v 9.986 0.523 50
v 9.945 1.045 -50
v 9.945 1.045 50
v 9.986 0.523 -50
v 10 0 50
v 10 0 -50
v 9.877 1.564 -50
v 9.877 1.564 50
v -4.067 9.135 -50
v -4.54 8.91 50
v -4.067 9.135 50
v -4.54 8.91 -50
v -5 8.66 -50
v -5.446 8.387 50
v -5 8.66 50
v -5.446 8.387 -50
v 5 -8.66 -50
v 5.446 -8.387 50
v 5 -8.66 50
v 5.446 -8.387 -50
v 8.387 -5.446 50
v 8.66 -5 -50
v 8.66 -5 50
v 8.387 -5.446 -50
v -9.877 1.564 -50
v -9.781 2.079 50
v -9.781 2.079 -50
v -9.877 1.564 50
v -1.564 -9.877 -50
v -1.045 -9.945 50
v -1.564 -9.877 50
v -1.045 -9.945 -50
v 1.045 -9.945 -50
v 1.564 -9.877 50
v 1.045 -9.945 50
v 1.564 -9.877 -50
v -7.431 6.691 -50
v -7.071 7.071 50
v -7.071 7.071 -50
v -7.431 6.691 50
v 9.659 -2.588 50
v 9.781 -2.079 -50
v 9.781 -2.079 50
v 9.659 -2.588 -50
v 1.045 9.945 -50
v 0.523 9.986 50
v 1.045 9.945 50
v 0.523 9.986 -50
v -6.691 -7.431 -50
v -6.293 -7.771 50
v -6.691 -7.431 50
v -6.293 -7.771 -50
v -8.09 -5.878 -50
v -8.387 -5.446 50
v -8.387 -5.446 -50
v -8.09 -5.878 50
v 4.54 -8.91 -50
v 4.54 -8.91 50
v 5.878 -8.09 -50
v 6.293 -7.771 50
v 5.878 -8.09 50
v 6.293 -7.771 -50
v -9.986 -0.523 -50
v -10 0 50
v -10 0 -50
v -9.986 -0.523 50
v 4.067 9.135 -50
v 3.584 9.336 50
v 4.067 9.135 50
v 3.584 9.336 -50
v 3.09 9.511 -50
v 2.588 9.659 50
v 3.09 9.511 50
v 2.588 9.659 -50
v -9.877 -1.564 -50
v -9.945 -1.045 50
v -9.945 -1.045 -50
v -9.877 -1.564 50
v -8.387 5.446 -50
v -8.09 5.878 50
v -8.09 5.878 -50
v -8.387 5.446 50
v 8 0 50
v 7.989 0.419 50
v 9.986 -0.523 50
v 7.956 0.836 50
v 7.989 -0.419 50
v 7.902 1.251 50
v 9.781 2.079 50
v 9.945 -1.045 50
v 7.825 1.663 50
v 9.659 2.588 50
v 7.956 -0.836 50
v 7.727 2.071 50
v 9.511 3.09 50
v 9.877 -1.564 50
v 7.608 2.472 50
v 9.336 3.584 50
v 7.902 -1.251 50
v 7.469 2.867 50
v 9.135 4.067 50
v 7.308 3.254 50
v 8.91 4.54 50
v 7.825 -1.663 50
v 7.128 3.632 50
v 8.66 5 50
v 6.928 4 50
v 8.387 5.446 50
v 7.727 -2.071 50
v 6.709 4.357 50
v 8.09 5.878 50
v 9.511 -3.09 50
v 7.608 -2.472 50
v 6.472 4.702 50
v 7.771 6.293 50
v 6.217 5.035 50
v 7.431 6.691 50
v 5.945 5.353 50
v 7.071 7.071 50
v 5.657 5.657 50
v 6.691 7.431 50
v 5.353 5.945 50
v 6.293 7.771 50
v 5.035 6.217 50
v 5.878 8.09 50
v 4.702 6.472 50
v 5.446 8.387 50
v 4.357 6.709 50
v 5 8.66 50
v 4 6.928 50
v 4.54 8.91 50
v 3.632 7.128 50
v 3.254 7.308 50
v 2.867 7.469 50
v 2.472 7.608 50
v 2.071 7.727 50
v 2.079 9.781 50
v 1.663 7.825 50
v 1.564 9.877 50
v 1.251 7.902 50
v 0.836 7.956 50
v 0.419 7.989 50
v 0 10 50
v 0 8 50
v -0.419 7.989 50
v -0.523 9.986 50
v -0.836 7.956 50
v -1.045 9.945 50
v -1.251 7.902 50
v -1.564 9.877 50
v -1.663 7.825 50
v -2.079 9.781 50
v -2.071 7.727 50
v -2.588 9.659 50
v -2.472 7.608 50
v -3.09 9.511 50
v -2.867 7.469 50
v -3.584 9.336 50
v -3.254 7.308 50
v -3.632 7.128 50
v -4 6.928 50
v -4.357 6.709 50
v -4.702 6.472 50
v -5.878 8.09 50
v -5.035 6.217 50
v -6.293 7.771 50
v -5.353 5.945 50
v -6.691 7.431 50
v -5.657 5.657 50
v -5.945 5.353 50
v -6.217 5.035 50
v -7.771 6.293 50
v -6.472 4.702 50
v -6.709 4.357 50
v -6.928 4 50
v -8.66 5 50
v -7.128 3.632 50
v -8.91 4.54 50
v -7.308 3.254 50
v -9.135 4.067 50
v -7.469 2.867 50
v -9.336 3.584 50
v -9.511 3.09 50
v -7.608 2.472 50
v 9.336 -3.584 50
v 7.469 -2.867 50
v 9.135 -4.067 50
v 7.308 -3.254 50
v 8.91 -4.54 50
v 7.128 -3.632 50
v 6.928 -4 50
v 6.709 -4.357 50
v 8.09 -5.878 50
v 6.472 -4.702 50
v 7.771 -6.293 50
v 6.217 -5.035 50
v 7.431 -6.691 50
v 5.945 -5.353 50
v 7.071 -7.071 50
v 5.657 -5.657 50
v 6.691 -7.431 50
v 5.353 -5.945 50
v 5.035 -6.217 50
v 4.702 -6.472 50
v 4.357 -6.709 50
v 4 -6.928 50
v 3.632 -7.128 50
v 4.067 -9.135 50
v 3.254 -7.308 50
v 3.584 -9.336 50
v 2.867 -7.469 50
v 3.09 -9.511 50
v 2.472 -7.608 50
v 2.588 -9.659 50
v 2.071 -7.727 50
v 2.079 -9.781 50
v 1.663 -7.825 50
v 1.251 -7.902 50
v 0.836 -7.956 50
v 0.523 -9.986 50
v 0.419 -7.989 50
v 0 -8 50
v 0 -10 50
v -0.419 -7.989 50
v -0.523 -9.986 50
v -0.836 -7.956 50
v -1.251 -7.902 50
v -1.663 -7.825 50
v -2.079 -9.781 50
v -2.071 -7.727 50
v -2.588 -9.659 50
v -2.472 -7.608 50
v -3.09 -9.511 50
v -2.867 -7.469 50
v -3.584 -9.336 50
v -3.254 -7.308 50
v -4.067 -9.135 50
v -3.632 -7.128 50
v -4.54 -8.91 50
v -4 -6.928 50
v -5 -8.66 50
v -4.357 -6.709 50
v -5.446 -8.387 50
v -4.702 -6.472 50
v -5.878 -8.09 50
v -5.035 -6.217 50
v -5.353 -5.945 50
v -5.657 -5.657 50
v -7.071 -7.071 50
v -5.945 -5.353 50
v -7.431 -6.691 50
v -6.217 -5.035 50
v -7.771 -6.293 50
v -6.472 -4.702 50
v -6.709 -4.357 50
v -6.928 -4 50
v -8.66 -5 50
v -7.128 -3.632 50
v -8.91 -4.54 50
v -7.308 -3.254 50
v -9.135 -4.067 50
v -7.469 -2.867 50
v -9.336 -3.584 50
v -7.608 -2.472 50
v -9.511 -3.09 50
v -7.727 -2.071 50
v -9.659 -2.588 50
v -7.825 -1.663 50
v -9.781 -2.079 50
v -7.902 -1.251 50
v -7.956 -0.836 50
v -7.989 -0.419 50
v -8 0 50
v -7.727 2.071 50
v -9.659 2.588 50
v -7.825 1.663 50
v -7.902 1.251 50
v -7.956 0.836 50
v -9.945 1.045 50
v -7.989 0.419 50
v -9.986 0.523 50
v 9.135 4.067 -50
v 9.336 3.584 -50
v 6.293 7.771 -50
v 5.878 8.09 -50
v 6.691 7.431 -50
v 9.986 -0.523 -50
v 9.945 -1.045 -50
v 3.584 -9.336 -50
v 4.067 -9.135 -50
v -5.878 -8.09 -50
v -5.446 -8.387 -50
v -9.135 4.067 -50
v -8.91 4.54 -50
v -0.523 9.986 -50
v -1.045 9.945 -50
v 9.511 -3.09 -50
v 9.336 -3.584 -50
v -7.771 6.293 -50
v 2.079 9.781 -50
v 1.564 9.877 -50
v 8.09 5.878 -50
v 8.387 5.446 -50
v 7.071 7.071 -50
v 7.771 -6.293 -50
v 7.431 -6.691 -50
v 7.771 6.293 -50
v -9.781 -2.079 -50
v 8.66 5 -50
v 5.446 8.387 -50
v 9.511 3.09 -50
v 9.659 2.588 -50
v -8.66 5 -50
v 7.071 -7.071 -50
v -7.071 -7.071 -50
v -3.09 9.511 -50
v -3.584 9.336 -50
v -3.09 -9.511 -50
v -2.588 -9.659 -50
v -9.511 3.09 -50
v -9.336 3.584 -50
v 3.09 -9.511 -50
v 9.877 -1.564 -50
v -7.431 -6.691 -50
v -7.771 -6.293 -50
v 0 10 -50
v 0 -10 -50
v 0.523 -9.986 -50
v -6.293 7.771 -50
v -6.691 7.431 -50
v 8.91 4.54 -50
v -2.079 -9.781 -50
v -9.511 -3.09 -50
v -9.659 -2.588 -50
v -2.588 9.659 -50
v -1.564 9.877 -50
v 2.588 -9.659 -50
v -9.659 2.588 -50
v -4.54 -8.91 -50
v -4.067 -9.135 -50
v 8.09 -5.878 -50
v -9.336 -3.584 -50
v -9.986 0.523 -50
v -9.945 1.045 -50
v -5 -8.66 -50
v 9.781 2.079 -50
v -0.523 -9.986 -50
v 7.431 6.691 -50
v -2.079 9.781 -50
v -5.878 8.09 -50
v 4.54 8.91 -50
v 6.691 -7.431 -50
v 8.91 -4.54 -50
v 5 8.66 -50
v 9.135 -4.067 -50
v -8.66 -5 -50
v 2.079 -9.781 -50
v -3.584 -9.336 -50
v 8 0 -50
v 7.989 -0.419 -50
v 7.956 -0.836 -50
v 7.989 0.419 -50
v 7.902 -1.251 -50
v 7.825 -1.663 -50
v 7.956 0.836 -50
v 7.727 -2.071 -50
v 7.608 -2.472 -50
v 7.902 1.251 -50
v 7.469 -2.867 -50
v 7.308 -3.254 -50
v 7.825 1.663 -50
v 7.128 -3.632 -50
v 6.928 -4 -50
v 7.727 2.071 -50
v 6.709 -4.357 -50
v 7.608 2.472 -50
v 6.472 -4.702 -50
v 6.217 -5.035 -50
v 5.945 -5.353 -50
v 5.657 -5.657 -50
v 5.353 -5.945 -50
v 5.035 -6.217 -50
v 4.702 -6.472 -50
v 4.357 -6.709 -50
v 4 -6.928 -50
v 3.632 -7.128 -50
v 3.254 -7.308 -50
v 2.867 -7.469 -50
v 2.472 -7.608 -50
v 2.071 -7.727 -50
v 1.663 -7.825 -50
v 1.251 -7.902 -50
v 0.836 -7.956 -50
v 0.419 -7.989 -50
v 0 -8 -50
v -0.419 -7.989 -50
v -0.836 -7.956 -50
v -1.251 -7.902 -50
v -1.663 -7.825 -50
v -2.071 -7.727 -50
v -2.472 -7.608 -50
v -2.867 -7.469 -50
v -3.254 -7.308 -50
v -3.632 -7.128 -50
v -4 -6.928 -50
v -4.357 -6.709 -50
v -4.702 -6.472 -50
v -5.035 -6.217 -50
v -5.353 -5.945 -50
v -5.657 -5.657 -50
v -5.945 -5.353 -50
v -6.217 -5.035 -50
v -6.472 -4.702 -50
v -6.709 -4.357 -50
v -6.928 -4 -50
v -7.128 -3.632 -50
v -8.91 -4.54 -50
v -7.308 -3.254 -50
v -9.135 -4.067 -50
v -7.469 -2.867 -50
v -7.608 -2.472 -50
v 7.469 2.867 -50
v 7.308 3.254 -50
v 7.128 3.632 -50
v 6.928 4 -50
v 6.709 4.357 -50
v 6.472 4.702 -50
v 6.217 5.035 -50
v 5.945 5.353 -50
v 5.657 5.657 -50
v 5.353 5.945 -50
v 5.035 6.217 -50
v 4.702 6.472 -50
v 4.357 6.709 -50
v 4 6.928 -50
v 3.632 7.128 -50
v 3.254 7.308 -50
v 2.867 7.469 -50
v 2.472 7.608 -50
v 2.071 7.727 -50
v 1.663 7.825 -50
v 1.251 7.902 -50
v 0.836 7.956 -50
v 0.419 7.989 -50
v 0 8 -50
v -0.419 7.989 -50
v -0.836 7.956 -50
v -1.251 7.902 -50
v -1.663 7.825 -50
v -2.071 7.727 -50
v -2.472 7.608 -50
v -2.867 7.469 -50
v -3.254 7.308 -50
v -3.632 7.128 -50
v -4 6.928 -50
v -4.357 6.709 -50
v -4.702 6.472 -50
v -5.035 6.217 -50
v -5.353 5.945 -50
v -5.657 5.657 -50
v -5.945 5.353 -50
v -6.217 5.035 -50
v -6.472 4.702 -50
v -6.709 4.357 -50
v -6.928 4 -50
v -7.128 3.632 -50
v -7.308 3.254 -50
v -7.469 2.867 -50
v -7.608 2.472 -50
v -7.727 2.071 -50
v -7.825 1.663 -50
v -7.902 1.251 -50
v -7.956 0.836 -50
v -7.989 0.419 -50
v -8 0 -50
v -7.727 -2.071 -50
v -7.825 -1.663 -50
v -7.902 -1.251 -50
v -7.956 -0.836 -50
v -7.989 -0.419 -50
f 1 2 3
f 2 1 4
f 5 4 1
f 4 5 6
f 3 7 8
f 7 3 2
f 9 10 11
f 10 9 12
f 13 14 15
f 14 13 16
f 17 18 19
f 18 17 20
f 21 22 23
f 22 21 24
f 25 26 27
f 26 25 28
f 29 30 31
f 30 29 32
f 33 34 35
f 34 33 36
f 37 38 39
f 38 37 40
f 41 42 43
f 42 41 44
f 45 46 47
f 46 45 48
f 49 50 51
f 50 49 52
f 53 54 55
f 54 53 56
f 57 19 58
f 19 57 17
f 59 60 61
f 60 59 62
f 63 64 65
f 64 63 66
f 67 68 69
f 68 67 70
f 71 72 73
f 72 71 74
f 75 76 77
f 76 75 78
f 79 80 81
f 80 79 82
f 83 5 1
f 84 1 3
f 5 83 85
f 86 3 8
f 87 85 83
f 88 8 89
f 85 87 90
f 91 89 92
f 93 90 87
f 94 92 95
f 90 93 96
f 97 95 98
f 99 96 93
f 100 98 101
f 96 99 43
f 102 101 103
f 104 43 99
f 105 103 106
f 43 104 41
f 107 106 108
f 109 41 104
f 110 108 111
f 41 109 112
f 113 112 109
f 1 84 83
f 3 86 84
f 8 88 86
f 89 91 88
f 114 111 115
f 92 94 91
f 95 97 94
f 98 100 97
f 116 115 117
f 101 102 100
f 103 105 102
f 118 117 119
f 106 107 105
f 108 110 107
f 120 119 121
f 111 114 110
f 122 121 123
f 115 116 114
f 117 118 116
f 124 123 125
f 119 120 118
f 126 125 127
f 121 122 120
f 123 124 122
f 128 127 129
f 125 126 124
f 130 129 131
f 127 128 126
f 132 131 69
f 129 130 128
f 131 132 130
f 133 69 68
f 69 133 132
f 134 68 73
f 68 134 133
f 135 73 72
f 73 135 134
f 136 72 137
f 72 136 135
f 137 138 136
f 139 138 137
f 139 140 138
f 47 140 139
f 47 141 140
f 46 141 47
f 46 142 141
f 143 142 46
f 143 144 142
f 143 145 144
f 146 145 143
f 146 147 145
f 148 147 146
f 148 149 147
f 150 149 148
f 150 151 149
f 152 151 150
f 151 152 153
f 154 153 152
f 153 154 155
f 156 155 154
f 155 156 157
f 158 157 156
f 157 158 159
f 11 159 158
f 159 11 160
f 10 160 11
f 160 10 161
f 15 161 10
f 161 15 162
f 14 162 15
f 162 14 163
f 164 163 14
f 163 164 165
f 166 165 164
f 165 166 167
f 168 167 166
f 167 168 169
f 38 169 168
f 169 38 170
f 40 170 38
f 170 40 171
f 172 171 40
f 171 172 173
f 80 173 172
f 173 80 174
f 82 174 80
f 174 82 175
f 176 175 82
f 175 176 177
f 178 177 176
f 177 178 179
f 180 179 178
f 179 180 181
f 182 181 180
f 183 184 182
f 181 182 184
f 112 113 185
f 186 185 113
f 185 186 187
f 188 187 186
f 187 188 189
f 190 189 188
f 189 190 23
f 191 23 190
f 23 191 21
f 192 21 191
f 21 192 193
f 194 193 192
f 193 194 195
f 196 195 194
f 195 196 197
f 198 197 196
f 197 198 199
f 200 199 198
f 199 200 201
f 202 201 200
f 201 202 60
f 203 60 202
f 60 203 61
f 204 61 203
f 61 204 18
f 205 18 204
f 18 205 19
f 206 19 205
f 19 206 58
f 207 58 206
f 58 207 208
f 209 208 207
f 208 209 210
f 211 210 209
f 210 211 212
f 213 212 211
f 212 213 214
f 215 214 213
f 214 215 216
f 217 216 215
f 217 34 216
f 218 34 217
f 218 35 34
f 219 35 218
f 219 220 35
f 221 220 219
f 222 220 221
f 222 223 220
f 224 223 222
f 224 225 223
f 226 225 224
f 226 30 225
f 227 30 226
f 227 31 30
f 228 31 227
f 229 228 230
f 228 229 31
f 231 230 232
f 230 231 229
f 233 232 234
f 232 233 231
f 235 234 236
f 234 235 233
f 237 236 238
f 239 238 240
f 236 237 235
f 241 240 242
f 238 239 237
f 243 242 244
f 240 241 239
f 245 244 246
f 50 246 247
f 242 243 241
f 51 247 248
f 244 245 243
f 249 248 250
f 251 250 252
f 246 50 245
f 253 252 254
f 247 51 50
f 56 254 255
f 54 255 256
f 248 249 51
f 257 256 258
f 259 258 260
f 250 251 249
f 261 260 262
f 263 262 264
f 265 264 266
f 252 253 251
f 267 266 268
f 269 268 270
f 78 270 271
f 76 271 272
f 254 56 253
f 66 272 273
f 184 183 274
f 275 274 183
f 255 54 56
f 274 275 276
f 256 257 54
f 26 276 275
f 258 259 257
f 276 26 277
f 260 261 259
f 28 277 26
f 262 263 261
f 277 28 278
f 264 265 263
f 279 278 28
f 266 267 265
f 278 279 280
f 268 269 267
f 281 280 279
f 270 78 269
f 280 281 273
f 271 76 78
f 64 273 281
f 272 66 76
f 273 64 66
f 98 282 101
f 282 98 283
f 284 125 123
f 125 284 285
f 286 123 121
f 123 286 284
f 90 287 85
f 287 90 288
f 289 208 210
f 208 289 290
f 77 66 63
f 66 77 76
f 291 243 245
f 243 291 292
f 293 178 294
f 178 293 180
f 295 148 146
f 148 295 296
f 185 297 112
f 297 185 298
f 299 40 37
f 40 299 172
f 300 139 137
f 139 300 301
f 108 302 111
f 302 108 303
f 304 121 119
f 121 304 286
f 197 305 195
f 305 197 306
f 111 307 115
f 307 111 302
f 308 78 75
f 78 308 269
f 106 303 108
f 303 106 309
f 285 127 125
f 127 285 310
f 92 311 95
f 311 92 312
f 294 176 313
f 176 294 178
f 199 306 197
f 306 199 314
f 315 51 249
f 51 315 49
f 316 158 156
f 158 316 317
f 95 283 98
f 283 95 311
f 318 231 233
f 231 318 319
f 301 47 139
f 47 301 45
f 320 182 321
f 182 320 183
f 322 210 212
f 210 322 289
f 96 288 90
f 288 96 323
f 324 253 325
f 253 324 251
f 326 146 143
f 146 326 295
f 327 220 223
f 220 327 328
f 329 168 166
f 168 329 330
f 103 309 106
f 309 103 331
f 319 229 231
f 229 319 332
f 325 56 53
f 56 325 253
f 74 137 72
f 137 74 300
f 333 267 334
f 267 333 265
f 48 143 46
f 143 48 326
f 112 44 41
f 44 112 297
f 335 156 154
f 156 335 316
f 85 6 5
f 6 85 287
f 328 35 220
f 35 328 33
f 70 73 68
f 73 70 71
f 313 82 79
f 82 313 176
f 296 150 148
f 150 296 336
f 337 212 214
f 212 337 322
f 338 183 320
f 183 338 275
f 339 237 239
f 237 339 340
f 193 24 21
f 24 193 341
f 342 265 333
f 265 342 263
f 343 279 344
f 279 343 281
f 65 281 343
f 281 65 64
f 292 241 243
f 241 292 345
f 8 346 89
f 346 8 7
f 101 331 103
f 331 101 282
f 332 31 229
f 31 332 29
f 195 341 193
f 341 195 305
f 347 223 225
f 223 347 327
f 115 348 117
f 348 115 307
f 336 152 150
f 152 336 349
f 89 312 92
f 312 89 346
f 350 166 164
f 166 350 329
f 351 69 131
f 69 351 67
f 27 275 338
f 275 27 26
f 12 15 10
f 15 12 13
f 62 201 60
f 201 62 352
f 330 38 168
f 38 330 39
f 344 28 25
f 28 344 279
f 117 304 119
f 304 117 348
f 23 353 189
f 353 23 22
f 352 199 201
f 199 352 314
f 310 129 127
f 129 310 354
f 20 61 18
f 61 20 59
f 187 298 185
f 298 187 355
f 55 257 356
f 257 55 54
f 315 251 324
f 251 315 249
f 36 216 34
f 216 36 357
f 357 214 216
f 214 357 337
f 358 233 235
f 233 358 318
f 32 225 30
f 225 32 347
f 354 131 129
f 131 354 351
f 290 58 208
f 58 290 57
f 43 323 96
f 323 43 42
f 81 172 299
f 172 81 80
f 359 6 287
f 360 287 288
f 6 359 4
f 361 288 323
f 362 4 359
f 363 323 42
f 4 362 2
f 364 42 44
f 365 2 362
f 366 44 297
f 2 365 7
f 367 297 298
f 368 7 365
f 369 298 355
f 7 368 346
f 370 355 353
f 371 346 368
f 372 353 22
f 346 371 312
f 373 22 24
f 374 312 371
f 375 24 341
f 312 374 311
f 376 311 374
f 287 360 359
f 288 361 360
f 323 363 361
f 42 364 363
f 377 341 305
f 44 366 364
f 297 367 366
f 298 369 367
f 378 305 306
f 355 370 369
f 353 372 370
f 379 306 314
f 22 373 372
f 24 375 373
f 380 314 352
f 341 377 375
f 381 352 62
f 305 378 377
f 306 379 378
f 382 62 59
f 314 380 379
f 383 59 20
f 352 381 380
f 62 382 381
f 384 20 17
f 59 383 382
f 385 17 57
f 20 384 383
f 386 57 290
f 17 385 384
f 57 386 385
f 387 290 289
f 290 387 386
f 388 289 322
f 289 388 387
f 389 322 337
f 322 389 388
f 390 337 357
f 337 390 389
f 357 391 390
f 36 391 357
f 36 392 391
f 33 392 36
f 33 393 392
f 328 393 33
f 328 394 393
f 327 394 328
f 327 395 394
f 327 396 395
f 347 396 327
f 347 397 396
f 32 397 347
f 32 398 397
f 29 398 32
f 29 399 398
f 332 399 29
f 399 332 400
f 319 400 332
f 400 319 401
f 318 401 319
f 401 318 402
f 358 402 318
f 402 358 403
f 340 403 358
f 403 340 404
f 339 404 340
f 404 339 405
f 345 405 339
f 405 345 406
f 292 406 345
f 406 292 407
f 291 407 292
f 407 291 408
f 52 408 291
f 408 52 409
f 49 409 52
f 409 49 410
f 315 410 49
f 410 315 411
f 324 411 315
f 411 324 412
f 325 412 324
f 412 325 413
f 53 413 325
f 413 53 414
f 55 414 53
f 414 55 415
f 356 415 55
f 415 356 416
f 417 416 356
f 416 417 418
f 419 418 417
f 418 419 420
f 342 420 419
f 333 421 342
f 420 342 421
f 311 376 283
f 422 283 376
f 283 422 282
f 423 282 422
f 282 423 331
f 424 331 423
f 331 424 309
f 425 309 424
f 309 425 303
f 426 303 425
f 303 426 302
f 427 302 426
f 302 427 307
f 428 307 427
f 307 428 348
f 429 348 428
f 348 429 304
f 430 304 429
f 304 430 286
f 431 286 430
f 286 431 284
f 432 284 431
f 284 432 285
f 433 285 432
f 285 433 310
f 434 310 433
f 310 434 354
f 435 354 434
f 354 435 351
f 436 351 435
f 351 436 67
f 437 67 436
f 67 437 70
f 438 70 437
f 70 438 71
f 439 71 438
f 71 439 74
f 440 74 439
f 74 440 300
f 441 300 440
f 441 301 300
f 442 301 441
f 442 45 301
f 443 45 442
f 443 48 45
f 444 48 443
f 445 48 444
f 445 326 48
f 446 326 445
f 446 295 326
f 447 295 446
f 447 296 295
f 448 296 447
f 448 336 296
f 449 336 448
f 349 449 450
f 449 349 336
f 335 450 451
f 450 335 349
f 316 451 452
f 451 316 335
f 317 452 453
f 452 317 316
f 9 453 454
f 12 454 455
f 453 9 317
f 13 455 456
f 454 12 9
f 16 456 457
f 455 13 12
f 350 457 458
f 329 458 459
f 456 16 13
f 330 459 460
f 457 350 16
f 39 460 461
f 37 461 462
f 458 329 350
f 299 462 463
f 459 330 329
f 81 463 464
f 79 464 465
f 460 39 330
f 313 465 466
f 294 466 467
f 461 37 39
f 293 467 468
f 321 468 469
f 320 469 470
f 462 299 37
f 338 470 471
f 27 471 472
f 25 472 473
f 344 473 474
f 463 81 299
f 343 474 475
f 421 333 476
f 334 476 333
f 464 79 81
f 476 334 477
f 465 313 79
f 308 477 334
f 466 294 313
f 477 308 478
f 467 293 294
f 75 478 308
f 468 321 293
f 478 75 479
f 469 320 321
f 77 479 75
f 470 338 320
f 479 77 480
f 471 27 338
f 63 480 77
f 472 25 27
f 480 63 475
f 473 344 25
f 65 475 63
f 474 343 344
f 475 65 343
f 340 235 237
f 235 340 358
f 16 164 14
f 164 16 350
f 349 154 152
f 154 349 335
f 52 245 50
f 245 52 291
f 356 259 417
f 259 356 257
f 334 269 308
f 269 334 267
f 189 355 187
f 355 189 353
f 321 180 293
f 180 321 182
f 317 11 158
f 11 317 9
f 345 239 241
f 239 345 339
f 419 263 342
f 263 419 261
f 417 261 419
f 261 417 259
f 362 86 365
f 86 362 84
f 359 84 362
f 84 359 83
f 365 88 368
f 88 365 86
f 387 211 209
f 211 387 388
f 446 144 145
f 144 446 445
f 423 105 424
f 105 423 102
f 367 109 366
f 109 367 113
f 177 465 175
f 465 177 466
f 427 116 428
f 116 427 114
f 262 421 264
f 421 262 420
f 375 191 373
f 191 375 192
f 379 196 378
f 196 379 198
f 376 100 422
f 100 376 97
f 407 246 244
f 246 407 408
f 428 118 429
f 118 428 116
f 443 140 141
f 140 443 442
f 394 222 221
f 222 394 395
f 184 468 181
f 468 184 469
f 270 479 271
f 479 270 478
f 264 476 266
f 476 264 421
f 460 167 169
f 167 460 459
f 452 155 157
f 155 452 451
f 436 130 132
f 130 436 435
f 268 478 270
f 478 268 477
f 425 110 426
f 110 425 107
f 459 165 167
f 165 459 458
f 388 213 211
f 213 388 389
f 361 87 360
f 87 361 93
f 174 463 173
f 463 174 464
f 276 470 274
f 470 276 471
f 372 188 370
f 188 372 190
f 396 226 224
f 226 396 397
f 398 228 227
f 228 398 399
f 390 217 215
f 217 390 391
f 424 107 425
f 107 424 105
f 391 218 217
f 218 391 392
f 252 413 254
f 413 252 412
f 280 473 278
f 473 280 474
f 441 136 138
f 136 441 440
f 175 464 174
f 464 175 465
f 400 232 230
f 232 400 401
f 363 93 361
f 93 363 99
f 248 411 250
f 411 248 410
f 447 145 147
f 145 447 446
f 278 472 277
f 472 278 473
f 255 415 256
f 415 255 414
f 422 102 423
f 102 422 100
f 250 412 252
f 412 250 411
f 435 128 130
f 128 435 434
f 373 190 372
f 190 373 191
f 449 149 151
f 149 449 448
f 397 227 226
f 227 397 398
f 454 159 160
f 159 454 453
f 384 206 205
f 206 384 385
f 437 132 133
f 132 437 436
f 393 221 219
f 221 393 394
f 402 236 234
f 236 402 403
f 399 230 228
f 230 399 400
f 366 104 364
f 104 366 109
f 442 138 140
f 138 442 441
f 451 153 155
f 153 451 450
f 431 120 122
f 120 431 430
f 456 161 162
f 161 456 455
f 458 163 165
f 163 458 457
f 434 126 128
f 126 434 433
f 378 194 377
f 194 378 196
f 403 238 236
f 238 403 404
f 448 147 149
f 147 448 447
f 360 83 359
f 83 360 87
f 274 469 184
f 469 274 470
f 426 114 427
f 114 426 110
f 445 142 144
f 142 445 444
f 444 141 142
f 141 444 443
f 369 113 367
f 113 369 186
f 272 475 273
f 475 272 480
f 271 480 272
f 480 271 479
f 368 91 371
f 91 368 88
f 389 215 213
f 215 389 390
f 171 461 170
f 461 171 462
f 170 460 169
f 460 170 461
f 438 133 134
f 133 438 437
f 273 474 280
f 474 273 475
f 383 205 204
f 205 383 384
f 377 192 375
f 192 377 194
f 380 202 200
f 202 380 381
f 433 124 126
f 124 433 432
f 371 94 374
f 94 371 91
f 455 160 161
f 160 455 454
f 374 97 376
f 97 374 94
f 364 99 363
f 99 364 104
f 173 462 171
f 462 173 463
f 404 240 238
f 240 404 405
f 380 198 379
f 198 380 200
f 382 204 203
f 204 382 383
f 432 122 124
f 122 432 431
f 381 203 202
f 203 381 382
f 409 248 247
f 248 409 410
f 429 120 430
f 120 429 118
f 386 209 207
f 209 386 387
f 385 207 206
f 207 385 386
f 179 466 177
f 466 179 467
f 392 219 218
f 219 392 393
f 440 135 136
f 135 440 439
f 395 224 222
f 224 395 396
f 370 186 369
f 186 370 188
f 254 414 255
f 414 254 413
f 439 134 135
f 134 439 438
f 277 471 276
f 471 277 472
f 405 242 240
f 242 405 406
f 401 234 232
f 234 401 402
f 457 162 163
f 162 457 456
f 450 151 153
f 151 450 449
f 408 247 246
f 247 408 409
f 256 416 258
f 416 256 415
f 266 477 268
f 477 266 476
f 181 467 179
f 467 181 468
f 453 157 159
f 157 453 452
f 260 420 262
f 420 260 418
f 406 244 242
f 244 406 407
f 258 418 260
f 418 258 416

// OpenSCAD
// file: ../components/tube/tube.scad
// File: tube.scad
//   Reference tube for demonstrating the reusable clamp.
//
// FileSummary: Hollow 20 mm reference tube.
//
// Module: tube()
// Usage:
//   tube();
// Description:
//   Creates a hollow tube along the local Z axis.
// Arguments:
//   outer_diameter = Outside tube diameter.
//   wall_thickness = Tube wall thickness.
//   length = Tube length.
TUBE_OUTER_DIAMETER = 20;
TUBE_WALL_THICKNESS = 2;
TUBE_LENGTH = 100;

module tube(
    outer_diameter = TUBE_OUTER_DIAMETER,
    wall_thickness = TUBE_WALL_THICKNESS,
    length = TUBE_LENGTH
) {
    inner_diameter = outer_diameter - 2 * wall_thickness;

    difference() {
        cylinder(d = outer_diameter, h = length, center = true);
        cylinder(d = inner_diameter, h = length + 0.2, center = true);
    }
}

// Module: tube_design()
// Usage:
//   tube_design("outer");
//   tube_design("bore");
//   tube_design("final");
// Description:
//   Documentation-oriented construction views. A shorter tube section is
//   rotated onto X so length and circular cross-section remain visible.
// Arguments:
//   view = Named design-documentation view.
module tube_design(view = "final") {
    design_length = 60;

    rotate([0, 90, 0]) {
        if (view == "outer") {
            color([1, 0, 0, 0.55])
                cylinder(
                    d = TUBE_OUTER_DIAMETER,
                    h = design_length,
                    center = true
                );
        } else if (view == "bore") {
            color([0.75, 0.75, 0.75, 0.4])
                cylinder(
                    d = TUBE_OUTER_DIAMETER,
                    h = design_length,
                    center = true
                );

            color([1, 0, 0, 0.55])
                cylinder(
                    d = TUBE_OUTER_DIAMETER - 2 * TUBE_WALL_THICKNESS,
                    h = design_length + 0.2,
                    center = true
                );
        } else {
            tube(length = design_length);
        }
    }
}
// main file
// Stable build entrypoint for the standalone reference tube.
use <../components/tube/tube.scad>

$fn = 120;

tube();
